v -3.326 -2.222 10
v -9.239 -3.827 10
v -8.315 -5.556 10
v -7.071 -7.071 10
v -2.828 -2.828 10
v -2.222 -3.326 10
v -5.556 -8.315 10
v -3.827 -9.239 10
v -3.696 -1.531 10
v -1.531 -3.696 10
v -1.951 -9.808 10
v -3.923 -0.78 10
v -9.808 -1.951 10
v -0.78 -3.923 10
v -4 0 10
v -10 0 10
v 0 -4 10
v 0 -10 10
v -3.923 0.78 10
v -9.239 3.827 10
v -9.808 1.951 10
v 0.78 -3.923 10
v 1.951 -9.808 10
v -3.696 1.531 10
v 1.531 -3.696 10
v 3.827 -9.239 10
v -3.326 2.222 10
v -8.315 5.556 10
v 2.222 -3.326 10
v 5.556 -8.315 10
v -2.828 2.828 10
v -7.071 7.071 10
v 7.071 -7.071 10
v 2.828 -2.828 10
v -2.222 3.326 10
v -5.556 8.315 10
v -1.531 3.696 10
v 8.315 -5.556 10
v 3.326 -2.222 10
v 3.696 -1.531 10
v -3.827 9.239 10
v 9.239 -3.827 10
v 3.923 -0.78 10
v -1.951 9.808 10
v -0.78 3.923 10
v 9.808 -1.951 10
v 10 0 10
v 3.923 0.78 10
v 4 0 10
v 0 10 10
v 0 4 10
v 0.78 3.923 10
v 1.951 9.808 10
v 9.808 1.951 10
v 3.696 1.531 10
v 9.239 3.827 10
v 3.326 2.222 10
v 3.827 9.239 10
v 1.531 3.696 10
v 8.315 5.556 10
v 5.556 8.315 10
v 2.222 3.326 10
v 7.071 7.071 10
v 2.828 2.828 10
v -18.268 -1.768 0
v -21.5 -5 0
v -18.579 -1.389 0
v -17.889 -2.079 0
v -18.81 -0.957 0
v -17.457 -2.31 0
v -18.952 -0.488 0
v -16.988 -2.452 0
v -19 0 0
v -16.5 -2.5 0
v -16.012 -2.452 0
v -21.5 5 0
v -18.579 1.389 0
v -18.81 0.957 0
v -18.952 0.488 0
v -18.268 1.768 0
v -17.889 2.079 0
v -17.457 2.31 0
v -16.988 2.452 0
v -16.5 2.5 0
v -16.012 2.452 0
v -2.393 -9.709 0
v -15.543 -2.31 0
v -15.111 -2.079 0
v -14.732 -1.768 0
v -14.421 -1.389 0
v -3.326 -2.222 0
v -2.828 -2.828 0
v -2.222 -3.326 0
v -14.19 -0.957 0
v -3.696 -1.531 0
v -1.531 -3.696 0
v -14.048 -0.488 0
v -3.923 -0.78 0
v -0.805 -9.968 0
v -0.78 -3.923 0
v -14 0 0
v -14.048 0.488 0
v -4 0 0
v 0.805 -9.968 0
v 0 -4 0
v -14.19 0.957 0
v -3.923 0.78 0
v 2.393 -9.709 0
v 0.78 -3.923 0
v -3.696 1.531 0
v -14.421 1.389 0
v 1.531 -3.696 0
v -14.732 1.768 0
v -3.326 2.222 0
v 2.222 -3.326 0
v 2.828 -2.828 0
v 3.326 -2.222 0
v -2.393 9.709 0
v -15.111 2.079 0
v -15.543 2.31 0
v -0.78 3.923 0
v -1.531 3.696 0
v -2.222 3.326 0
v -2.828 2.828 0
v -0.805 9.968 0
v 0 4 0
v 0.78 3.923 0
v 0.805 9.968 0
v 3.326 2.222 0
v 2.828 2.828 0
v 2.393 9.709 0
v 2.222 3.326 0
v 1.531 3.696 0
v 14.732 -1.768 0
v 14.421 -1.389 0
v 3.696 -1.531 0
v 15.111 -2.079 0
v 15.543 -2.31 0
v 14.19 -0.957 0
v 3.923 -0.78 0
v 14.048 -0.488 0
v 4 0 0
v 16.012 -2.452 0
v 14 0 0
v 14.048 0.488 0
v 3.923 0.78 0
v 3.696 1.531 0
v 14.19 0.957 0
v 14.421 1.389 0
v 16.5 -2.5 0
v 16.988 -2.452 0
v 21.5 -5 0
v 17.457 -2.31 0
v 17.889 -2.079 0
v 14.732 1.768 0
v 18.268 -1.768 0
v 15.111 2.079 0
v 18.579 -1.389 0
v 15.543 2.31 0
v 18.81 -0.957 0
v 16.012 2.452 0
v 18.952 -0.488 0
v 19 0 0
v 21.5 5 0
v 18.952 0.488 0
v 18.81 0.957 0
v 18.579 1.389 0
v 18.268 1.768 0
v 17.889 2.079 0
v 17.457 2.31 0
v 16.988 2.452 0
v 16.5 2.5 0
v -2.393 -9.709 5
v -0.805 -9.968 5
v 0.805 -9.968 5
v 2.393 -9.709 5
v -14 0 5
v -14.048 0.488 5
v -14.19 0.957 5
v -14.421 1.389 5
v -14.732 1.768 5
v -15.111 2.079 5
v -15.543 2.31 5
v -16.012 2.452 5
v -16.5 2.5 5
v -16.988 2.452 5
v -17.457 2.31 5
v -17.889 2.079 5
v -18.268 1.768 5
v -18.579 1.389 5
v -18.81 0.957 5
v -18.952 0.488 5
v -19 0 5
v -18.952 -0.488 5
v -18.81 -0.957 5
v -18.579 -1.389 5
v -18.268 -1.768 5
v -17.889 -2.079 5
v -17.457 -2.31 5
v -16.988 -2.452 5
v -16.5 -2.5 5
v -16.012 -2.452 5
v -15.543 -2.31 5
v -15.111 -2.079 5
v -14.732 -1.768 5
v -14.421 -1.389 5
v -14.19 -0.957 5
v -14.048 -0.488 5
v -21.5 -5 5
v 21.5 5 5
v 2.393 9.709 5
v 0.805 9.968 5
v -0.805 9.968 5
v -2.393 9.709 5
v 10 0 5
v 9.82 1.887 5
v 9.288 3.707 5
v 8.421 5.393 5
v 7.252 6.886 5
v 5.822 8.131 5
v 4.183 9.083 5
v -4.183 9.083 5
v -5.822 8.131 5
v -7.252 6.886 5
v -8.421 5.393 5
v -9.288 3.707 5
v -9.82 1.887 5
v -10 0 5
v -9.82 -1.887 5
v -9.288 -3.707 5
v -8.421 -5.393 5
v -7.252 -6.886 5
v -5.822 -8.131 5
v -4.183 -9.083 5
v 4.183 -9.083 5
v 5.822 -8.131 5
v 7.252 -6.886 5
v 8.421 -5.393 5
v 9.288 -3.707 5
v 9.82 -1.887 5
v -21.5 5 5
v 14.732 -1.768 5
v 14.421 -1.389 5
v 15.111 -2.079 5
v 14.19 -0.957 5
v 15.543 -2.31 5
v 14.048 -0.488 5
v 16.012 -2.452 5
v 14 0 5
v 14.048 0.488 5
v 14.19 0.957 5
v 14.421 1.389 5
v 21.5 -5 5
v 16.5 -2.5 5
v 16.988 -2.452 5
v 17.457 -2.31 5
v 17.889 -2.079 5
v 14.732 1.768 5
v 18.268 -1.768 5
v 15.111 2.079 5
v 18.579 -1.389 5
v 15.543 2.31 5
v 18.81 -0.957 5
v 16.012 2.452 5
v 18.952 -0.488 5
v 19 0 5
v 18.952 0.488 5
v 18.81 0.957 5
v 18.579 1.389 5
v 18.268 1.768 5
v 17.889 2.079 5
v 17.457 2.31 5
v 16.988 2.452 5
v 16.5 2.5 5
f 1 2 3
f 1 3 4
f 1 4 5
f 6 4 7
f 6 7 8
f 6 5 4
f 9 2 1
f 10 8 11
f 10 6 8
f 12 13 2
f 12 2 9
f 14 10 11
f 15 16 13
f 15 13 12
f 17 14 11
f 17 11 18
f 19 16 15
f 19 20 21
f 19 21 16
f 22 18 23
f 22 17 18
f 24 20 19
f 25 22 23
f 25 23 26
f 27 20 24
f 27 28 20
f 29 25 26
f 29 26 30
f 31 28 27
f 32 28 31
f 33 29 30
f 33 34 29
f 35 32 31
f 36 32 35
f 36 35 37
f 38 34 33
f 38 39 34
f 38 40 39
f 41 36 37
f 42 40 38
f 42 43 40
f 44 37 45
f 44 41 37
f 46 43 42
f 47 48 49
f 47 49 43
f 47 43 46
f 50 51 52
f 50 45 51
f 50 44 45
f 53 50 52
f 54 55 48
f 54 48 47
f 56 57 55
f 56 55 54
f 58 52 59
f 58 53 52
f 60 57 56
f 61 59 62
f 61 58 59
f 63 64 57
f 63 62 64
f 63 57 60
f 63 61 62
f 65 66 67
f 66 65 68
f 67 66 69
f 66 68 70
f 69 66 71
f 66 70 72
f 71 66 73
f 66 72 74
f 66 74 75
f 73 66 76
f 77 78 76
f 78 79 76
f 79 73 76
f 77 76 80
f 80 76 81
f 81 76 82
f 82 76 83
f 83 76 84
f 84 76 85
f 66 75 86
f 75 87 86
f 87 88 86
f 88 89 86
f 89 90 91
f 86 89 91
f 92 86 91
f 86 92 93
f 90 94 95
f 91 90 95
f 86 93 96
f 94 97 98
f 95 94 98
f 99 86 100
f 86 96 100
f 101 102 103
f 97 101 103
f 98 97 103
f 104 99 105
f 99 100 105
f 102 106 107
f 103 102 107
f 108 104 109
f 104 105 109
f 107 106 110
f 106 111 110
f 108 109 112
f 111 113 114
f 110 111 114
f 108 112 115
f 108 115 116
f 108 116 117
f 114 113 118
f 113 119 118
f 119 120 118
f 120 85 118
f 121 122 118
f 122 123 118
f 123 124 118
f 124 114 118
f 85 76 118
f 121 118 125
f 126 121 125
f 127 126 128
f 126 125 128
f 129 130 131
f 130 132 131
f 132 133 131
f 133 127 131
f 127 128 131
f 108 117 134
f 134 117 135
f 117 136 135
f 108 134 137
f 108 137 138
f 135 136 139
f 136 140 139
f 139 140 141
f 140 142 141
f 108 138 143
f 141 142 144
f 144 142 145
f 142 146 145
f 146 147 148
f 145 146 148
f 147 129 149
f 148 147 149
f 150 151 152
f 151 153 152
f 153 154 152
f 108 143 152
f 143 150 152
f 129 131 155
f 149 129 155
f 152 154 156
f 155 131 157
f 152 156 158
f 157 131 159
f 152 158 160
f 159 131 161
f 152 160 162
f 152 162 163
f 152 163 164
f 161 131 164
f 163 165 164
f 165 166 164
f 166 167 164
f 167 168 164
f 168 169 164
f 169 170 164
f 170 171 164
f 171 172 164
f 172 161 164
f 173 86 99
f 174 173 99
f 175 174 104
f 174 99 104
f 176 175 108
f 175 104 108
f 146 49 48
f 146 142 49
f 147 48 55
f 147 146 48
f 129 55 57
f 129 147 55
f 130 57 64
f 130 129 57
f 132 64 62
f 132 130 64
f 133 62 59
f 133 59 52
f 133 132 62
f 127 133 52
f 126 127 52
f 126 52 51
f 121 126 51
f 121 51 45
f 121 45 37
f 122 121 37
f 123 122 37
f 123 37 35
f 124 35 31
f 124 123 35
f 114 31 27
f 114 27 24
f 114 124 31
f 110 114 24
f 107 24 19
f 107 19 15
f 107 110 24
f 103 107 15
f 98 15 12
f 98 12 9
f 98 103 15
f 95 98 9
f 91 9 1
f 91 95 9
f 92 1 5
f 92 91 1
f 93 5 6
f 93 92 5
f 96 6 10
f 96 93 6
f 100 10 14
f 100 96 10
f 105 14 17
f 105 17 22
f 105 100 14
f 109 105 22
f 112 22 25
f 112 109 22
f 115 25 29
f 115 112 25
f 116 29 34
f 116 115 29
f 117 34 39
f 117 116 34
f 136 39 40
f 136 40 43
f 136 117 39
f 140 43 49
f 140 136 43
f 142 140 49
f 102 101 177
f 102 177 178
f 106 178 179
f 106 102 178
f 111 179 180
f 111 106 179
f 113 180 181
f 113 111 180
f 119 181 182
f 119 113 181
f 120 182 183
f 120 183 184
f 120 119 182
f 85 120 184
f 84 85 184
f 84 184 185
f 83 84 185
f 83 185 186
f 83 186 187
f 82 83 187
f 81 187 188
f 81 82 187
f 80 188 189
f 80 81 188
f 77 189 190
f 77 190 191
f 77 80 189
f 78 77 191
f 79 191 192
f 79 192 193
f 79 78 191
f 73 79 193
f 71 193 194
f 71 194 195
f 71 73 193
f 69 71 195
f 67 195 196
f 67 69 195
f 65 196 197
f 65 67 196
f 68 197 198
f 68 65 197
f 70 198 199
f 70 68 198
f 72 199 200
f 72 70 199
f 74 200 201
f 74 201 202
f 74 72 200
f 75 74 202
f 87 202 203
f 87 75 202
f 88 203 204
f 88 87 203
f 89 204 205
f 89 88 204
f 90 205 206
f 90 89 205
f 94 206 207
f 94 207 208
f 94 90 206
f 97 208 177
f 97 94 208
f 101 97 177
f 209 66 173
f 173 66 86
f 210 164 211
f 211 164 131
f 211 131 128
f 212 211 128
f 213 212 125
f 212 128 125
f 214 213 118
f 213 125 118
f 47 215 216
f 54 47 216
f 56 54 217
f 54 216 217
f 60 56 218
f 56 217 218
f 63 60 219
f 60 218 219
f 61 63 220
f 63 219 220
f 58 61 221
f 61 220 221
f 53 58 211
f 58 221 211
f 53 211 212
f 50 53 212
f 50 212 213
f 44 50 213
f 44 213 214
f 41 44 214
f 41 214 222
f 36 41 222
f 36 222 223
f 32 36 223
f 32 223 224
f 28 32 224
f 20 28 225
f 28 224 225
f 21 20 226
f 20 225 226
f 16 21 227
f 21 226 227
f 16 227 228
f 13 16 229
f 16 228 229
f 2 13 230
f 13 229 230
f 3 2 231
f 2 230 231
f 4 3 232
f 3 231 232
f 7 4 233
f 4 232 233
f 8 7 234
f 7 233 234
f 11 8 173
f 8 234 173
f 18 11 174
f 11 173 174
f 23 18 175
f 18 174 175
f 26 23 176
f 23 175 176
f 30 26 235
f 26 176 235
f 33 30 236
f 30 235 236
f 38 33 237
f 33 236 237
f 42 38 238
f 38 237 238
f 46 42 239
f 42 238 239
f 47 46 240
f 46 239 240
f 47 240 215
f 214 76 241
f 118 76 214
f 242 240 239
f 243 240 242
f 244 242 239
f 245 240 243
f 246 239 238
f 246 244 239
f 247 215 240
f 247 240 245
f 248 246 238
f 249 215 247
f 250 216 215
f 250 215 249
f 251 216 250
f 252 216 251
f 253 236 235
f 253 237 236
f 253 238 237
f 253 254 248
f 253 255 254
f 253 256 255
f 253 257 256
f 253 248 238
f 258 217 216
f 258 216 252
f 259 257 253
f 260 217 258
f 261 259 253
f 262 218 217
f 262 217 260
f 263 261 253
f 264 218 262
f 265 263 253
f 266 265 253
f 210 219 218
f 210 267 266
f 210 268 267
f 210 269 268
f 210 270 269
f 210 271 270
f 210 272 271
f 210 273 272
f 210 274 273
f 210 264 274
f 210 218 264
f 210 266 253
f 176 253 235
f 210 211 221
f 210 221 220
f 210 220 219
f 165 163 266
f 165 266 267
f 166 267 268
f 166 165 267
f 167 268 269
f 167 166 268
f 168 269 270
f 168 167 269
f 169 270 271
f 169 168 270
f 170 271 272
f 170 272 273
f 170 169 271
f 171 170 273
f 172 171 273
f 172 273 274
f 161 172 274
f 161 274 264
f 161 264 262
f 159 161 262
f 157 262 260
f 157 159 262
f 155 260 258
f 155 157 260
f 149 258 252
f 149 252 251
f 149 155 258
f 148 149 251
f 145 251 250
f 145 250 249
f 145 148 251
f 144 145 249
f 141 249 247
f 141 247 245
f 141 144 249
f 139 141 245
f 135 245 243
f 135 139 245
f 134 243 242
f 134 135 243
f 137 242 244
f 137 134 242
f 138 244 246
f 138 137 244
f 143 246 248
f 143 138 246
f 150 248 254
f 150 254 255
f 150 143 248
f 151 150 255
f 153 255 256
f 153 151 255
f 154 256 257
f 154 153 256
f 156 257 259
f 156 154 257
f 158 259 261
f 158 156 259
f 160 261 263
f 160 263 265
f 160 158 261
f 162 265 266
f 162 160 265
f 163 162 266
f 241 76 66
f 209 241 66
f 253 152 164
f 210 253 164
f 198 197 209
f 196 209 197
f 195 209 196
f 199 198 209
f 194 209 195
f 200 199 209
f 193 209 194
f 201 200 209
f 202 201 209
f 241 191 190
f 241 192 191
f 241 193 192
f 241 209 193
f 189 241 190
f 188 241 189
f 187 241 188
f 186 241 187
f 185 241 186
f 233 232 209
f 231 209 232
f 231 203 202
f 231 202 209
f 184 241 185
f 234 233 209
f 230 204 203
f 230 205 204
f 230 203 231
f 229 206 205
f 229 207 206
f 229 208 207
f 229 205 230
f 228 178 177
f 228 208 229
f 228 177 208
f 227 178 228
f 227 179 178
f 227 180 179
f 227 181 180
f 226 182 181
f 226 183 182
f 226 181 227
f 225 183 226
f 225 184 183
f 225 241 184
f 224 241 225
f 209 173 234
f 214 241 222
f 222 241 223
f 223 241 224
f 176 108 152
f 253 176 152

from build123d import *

# Parameters (mm, degrees)
SKETCH_R      = 4
SKETCH_R_2    = 2.5
PAD_DEPTH     = 5
SKETCH001_R   = 10
SKETCH001_R_2 = 4
PAD001_DEPTH  = 5


with BuildPart() as part:
    # Sketch → Pad (new body)
    with BuildSketch(Plane.XY):
        with BuildLine():
            ThreePointArc((-2.3931586809, -9.7094176719), (0, -10), (2.3931586809, -9.7094176719))
            Line((2.3931586809, -9.7094176719), (21.5, -5))
            Line((21.5, -5), (21.5, 5))
            Line((21.5, 5), (2.3931586809, 9.7094176719))
            ThreePointArc((2.3931586809, 9.7094176719), (0, 10), (-2.3931586809, 9.7094176719))
            Line((-21.5, 5), (-2.3931586809, 9.7094176719))
            Line((-21.5, 5), (-21.5, -5))
            Line((-21.5, -5), (-2.3931586809, -9.7094176719))
        make_face()
        Circle(SKETCH_R, mode=Mode.SUBTRACT)
        with Locations((-16.5, 0)):
            Circle(SKETCH_R_2, mode=Mode.SUBTRACT)
        with Locations((16.5, 0)):
            Circle(SKETCH_R_2, mode=Mode.SUBTRACT)
    extrude(amount=PAD_DEPTH)

    # Sketch001 (on Face13 of Pad) → Pad001 (join)
    with BuildSketch(Plane.XY.offset(5)):
        Circle(SKETCH001_R)
        Circle(SKETCH001_R_2, mode=Mode.SUBTRACT)
    extrude(amount=PAD001_DEPTH)


solid = part.part
